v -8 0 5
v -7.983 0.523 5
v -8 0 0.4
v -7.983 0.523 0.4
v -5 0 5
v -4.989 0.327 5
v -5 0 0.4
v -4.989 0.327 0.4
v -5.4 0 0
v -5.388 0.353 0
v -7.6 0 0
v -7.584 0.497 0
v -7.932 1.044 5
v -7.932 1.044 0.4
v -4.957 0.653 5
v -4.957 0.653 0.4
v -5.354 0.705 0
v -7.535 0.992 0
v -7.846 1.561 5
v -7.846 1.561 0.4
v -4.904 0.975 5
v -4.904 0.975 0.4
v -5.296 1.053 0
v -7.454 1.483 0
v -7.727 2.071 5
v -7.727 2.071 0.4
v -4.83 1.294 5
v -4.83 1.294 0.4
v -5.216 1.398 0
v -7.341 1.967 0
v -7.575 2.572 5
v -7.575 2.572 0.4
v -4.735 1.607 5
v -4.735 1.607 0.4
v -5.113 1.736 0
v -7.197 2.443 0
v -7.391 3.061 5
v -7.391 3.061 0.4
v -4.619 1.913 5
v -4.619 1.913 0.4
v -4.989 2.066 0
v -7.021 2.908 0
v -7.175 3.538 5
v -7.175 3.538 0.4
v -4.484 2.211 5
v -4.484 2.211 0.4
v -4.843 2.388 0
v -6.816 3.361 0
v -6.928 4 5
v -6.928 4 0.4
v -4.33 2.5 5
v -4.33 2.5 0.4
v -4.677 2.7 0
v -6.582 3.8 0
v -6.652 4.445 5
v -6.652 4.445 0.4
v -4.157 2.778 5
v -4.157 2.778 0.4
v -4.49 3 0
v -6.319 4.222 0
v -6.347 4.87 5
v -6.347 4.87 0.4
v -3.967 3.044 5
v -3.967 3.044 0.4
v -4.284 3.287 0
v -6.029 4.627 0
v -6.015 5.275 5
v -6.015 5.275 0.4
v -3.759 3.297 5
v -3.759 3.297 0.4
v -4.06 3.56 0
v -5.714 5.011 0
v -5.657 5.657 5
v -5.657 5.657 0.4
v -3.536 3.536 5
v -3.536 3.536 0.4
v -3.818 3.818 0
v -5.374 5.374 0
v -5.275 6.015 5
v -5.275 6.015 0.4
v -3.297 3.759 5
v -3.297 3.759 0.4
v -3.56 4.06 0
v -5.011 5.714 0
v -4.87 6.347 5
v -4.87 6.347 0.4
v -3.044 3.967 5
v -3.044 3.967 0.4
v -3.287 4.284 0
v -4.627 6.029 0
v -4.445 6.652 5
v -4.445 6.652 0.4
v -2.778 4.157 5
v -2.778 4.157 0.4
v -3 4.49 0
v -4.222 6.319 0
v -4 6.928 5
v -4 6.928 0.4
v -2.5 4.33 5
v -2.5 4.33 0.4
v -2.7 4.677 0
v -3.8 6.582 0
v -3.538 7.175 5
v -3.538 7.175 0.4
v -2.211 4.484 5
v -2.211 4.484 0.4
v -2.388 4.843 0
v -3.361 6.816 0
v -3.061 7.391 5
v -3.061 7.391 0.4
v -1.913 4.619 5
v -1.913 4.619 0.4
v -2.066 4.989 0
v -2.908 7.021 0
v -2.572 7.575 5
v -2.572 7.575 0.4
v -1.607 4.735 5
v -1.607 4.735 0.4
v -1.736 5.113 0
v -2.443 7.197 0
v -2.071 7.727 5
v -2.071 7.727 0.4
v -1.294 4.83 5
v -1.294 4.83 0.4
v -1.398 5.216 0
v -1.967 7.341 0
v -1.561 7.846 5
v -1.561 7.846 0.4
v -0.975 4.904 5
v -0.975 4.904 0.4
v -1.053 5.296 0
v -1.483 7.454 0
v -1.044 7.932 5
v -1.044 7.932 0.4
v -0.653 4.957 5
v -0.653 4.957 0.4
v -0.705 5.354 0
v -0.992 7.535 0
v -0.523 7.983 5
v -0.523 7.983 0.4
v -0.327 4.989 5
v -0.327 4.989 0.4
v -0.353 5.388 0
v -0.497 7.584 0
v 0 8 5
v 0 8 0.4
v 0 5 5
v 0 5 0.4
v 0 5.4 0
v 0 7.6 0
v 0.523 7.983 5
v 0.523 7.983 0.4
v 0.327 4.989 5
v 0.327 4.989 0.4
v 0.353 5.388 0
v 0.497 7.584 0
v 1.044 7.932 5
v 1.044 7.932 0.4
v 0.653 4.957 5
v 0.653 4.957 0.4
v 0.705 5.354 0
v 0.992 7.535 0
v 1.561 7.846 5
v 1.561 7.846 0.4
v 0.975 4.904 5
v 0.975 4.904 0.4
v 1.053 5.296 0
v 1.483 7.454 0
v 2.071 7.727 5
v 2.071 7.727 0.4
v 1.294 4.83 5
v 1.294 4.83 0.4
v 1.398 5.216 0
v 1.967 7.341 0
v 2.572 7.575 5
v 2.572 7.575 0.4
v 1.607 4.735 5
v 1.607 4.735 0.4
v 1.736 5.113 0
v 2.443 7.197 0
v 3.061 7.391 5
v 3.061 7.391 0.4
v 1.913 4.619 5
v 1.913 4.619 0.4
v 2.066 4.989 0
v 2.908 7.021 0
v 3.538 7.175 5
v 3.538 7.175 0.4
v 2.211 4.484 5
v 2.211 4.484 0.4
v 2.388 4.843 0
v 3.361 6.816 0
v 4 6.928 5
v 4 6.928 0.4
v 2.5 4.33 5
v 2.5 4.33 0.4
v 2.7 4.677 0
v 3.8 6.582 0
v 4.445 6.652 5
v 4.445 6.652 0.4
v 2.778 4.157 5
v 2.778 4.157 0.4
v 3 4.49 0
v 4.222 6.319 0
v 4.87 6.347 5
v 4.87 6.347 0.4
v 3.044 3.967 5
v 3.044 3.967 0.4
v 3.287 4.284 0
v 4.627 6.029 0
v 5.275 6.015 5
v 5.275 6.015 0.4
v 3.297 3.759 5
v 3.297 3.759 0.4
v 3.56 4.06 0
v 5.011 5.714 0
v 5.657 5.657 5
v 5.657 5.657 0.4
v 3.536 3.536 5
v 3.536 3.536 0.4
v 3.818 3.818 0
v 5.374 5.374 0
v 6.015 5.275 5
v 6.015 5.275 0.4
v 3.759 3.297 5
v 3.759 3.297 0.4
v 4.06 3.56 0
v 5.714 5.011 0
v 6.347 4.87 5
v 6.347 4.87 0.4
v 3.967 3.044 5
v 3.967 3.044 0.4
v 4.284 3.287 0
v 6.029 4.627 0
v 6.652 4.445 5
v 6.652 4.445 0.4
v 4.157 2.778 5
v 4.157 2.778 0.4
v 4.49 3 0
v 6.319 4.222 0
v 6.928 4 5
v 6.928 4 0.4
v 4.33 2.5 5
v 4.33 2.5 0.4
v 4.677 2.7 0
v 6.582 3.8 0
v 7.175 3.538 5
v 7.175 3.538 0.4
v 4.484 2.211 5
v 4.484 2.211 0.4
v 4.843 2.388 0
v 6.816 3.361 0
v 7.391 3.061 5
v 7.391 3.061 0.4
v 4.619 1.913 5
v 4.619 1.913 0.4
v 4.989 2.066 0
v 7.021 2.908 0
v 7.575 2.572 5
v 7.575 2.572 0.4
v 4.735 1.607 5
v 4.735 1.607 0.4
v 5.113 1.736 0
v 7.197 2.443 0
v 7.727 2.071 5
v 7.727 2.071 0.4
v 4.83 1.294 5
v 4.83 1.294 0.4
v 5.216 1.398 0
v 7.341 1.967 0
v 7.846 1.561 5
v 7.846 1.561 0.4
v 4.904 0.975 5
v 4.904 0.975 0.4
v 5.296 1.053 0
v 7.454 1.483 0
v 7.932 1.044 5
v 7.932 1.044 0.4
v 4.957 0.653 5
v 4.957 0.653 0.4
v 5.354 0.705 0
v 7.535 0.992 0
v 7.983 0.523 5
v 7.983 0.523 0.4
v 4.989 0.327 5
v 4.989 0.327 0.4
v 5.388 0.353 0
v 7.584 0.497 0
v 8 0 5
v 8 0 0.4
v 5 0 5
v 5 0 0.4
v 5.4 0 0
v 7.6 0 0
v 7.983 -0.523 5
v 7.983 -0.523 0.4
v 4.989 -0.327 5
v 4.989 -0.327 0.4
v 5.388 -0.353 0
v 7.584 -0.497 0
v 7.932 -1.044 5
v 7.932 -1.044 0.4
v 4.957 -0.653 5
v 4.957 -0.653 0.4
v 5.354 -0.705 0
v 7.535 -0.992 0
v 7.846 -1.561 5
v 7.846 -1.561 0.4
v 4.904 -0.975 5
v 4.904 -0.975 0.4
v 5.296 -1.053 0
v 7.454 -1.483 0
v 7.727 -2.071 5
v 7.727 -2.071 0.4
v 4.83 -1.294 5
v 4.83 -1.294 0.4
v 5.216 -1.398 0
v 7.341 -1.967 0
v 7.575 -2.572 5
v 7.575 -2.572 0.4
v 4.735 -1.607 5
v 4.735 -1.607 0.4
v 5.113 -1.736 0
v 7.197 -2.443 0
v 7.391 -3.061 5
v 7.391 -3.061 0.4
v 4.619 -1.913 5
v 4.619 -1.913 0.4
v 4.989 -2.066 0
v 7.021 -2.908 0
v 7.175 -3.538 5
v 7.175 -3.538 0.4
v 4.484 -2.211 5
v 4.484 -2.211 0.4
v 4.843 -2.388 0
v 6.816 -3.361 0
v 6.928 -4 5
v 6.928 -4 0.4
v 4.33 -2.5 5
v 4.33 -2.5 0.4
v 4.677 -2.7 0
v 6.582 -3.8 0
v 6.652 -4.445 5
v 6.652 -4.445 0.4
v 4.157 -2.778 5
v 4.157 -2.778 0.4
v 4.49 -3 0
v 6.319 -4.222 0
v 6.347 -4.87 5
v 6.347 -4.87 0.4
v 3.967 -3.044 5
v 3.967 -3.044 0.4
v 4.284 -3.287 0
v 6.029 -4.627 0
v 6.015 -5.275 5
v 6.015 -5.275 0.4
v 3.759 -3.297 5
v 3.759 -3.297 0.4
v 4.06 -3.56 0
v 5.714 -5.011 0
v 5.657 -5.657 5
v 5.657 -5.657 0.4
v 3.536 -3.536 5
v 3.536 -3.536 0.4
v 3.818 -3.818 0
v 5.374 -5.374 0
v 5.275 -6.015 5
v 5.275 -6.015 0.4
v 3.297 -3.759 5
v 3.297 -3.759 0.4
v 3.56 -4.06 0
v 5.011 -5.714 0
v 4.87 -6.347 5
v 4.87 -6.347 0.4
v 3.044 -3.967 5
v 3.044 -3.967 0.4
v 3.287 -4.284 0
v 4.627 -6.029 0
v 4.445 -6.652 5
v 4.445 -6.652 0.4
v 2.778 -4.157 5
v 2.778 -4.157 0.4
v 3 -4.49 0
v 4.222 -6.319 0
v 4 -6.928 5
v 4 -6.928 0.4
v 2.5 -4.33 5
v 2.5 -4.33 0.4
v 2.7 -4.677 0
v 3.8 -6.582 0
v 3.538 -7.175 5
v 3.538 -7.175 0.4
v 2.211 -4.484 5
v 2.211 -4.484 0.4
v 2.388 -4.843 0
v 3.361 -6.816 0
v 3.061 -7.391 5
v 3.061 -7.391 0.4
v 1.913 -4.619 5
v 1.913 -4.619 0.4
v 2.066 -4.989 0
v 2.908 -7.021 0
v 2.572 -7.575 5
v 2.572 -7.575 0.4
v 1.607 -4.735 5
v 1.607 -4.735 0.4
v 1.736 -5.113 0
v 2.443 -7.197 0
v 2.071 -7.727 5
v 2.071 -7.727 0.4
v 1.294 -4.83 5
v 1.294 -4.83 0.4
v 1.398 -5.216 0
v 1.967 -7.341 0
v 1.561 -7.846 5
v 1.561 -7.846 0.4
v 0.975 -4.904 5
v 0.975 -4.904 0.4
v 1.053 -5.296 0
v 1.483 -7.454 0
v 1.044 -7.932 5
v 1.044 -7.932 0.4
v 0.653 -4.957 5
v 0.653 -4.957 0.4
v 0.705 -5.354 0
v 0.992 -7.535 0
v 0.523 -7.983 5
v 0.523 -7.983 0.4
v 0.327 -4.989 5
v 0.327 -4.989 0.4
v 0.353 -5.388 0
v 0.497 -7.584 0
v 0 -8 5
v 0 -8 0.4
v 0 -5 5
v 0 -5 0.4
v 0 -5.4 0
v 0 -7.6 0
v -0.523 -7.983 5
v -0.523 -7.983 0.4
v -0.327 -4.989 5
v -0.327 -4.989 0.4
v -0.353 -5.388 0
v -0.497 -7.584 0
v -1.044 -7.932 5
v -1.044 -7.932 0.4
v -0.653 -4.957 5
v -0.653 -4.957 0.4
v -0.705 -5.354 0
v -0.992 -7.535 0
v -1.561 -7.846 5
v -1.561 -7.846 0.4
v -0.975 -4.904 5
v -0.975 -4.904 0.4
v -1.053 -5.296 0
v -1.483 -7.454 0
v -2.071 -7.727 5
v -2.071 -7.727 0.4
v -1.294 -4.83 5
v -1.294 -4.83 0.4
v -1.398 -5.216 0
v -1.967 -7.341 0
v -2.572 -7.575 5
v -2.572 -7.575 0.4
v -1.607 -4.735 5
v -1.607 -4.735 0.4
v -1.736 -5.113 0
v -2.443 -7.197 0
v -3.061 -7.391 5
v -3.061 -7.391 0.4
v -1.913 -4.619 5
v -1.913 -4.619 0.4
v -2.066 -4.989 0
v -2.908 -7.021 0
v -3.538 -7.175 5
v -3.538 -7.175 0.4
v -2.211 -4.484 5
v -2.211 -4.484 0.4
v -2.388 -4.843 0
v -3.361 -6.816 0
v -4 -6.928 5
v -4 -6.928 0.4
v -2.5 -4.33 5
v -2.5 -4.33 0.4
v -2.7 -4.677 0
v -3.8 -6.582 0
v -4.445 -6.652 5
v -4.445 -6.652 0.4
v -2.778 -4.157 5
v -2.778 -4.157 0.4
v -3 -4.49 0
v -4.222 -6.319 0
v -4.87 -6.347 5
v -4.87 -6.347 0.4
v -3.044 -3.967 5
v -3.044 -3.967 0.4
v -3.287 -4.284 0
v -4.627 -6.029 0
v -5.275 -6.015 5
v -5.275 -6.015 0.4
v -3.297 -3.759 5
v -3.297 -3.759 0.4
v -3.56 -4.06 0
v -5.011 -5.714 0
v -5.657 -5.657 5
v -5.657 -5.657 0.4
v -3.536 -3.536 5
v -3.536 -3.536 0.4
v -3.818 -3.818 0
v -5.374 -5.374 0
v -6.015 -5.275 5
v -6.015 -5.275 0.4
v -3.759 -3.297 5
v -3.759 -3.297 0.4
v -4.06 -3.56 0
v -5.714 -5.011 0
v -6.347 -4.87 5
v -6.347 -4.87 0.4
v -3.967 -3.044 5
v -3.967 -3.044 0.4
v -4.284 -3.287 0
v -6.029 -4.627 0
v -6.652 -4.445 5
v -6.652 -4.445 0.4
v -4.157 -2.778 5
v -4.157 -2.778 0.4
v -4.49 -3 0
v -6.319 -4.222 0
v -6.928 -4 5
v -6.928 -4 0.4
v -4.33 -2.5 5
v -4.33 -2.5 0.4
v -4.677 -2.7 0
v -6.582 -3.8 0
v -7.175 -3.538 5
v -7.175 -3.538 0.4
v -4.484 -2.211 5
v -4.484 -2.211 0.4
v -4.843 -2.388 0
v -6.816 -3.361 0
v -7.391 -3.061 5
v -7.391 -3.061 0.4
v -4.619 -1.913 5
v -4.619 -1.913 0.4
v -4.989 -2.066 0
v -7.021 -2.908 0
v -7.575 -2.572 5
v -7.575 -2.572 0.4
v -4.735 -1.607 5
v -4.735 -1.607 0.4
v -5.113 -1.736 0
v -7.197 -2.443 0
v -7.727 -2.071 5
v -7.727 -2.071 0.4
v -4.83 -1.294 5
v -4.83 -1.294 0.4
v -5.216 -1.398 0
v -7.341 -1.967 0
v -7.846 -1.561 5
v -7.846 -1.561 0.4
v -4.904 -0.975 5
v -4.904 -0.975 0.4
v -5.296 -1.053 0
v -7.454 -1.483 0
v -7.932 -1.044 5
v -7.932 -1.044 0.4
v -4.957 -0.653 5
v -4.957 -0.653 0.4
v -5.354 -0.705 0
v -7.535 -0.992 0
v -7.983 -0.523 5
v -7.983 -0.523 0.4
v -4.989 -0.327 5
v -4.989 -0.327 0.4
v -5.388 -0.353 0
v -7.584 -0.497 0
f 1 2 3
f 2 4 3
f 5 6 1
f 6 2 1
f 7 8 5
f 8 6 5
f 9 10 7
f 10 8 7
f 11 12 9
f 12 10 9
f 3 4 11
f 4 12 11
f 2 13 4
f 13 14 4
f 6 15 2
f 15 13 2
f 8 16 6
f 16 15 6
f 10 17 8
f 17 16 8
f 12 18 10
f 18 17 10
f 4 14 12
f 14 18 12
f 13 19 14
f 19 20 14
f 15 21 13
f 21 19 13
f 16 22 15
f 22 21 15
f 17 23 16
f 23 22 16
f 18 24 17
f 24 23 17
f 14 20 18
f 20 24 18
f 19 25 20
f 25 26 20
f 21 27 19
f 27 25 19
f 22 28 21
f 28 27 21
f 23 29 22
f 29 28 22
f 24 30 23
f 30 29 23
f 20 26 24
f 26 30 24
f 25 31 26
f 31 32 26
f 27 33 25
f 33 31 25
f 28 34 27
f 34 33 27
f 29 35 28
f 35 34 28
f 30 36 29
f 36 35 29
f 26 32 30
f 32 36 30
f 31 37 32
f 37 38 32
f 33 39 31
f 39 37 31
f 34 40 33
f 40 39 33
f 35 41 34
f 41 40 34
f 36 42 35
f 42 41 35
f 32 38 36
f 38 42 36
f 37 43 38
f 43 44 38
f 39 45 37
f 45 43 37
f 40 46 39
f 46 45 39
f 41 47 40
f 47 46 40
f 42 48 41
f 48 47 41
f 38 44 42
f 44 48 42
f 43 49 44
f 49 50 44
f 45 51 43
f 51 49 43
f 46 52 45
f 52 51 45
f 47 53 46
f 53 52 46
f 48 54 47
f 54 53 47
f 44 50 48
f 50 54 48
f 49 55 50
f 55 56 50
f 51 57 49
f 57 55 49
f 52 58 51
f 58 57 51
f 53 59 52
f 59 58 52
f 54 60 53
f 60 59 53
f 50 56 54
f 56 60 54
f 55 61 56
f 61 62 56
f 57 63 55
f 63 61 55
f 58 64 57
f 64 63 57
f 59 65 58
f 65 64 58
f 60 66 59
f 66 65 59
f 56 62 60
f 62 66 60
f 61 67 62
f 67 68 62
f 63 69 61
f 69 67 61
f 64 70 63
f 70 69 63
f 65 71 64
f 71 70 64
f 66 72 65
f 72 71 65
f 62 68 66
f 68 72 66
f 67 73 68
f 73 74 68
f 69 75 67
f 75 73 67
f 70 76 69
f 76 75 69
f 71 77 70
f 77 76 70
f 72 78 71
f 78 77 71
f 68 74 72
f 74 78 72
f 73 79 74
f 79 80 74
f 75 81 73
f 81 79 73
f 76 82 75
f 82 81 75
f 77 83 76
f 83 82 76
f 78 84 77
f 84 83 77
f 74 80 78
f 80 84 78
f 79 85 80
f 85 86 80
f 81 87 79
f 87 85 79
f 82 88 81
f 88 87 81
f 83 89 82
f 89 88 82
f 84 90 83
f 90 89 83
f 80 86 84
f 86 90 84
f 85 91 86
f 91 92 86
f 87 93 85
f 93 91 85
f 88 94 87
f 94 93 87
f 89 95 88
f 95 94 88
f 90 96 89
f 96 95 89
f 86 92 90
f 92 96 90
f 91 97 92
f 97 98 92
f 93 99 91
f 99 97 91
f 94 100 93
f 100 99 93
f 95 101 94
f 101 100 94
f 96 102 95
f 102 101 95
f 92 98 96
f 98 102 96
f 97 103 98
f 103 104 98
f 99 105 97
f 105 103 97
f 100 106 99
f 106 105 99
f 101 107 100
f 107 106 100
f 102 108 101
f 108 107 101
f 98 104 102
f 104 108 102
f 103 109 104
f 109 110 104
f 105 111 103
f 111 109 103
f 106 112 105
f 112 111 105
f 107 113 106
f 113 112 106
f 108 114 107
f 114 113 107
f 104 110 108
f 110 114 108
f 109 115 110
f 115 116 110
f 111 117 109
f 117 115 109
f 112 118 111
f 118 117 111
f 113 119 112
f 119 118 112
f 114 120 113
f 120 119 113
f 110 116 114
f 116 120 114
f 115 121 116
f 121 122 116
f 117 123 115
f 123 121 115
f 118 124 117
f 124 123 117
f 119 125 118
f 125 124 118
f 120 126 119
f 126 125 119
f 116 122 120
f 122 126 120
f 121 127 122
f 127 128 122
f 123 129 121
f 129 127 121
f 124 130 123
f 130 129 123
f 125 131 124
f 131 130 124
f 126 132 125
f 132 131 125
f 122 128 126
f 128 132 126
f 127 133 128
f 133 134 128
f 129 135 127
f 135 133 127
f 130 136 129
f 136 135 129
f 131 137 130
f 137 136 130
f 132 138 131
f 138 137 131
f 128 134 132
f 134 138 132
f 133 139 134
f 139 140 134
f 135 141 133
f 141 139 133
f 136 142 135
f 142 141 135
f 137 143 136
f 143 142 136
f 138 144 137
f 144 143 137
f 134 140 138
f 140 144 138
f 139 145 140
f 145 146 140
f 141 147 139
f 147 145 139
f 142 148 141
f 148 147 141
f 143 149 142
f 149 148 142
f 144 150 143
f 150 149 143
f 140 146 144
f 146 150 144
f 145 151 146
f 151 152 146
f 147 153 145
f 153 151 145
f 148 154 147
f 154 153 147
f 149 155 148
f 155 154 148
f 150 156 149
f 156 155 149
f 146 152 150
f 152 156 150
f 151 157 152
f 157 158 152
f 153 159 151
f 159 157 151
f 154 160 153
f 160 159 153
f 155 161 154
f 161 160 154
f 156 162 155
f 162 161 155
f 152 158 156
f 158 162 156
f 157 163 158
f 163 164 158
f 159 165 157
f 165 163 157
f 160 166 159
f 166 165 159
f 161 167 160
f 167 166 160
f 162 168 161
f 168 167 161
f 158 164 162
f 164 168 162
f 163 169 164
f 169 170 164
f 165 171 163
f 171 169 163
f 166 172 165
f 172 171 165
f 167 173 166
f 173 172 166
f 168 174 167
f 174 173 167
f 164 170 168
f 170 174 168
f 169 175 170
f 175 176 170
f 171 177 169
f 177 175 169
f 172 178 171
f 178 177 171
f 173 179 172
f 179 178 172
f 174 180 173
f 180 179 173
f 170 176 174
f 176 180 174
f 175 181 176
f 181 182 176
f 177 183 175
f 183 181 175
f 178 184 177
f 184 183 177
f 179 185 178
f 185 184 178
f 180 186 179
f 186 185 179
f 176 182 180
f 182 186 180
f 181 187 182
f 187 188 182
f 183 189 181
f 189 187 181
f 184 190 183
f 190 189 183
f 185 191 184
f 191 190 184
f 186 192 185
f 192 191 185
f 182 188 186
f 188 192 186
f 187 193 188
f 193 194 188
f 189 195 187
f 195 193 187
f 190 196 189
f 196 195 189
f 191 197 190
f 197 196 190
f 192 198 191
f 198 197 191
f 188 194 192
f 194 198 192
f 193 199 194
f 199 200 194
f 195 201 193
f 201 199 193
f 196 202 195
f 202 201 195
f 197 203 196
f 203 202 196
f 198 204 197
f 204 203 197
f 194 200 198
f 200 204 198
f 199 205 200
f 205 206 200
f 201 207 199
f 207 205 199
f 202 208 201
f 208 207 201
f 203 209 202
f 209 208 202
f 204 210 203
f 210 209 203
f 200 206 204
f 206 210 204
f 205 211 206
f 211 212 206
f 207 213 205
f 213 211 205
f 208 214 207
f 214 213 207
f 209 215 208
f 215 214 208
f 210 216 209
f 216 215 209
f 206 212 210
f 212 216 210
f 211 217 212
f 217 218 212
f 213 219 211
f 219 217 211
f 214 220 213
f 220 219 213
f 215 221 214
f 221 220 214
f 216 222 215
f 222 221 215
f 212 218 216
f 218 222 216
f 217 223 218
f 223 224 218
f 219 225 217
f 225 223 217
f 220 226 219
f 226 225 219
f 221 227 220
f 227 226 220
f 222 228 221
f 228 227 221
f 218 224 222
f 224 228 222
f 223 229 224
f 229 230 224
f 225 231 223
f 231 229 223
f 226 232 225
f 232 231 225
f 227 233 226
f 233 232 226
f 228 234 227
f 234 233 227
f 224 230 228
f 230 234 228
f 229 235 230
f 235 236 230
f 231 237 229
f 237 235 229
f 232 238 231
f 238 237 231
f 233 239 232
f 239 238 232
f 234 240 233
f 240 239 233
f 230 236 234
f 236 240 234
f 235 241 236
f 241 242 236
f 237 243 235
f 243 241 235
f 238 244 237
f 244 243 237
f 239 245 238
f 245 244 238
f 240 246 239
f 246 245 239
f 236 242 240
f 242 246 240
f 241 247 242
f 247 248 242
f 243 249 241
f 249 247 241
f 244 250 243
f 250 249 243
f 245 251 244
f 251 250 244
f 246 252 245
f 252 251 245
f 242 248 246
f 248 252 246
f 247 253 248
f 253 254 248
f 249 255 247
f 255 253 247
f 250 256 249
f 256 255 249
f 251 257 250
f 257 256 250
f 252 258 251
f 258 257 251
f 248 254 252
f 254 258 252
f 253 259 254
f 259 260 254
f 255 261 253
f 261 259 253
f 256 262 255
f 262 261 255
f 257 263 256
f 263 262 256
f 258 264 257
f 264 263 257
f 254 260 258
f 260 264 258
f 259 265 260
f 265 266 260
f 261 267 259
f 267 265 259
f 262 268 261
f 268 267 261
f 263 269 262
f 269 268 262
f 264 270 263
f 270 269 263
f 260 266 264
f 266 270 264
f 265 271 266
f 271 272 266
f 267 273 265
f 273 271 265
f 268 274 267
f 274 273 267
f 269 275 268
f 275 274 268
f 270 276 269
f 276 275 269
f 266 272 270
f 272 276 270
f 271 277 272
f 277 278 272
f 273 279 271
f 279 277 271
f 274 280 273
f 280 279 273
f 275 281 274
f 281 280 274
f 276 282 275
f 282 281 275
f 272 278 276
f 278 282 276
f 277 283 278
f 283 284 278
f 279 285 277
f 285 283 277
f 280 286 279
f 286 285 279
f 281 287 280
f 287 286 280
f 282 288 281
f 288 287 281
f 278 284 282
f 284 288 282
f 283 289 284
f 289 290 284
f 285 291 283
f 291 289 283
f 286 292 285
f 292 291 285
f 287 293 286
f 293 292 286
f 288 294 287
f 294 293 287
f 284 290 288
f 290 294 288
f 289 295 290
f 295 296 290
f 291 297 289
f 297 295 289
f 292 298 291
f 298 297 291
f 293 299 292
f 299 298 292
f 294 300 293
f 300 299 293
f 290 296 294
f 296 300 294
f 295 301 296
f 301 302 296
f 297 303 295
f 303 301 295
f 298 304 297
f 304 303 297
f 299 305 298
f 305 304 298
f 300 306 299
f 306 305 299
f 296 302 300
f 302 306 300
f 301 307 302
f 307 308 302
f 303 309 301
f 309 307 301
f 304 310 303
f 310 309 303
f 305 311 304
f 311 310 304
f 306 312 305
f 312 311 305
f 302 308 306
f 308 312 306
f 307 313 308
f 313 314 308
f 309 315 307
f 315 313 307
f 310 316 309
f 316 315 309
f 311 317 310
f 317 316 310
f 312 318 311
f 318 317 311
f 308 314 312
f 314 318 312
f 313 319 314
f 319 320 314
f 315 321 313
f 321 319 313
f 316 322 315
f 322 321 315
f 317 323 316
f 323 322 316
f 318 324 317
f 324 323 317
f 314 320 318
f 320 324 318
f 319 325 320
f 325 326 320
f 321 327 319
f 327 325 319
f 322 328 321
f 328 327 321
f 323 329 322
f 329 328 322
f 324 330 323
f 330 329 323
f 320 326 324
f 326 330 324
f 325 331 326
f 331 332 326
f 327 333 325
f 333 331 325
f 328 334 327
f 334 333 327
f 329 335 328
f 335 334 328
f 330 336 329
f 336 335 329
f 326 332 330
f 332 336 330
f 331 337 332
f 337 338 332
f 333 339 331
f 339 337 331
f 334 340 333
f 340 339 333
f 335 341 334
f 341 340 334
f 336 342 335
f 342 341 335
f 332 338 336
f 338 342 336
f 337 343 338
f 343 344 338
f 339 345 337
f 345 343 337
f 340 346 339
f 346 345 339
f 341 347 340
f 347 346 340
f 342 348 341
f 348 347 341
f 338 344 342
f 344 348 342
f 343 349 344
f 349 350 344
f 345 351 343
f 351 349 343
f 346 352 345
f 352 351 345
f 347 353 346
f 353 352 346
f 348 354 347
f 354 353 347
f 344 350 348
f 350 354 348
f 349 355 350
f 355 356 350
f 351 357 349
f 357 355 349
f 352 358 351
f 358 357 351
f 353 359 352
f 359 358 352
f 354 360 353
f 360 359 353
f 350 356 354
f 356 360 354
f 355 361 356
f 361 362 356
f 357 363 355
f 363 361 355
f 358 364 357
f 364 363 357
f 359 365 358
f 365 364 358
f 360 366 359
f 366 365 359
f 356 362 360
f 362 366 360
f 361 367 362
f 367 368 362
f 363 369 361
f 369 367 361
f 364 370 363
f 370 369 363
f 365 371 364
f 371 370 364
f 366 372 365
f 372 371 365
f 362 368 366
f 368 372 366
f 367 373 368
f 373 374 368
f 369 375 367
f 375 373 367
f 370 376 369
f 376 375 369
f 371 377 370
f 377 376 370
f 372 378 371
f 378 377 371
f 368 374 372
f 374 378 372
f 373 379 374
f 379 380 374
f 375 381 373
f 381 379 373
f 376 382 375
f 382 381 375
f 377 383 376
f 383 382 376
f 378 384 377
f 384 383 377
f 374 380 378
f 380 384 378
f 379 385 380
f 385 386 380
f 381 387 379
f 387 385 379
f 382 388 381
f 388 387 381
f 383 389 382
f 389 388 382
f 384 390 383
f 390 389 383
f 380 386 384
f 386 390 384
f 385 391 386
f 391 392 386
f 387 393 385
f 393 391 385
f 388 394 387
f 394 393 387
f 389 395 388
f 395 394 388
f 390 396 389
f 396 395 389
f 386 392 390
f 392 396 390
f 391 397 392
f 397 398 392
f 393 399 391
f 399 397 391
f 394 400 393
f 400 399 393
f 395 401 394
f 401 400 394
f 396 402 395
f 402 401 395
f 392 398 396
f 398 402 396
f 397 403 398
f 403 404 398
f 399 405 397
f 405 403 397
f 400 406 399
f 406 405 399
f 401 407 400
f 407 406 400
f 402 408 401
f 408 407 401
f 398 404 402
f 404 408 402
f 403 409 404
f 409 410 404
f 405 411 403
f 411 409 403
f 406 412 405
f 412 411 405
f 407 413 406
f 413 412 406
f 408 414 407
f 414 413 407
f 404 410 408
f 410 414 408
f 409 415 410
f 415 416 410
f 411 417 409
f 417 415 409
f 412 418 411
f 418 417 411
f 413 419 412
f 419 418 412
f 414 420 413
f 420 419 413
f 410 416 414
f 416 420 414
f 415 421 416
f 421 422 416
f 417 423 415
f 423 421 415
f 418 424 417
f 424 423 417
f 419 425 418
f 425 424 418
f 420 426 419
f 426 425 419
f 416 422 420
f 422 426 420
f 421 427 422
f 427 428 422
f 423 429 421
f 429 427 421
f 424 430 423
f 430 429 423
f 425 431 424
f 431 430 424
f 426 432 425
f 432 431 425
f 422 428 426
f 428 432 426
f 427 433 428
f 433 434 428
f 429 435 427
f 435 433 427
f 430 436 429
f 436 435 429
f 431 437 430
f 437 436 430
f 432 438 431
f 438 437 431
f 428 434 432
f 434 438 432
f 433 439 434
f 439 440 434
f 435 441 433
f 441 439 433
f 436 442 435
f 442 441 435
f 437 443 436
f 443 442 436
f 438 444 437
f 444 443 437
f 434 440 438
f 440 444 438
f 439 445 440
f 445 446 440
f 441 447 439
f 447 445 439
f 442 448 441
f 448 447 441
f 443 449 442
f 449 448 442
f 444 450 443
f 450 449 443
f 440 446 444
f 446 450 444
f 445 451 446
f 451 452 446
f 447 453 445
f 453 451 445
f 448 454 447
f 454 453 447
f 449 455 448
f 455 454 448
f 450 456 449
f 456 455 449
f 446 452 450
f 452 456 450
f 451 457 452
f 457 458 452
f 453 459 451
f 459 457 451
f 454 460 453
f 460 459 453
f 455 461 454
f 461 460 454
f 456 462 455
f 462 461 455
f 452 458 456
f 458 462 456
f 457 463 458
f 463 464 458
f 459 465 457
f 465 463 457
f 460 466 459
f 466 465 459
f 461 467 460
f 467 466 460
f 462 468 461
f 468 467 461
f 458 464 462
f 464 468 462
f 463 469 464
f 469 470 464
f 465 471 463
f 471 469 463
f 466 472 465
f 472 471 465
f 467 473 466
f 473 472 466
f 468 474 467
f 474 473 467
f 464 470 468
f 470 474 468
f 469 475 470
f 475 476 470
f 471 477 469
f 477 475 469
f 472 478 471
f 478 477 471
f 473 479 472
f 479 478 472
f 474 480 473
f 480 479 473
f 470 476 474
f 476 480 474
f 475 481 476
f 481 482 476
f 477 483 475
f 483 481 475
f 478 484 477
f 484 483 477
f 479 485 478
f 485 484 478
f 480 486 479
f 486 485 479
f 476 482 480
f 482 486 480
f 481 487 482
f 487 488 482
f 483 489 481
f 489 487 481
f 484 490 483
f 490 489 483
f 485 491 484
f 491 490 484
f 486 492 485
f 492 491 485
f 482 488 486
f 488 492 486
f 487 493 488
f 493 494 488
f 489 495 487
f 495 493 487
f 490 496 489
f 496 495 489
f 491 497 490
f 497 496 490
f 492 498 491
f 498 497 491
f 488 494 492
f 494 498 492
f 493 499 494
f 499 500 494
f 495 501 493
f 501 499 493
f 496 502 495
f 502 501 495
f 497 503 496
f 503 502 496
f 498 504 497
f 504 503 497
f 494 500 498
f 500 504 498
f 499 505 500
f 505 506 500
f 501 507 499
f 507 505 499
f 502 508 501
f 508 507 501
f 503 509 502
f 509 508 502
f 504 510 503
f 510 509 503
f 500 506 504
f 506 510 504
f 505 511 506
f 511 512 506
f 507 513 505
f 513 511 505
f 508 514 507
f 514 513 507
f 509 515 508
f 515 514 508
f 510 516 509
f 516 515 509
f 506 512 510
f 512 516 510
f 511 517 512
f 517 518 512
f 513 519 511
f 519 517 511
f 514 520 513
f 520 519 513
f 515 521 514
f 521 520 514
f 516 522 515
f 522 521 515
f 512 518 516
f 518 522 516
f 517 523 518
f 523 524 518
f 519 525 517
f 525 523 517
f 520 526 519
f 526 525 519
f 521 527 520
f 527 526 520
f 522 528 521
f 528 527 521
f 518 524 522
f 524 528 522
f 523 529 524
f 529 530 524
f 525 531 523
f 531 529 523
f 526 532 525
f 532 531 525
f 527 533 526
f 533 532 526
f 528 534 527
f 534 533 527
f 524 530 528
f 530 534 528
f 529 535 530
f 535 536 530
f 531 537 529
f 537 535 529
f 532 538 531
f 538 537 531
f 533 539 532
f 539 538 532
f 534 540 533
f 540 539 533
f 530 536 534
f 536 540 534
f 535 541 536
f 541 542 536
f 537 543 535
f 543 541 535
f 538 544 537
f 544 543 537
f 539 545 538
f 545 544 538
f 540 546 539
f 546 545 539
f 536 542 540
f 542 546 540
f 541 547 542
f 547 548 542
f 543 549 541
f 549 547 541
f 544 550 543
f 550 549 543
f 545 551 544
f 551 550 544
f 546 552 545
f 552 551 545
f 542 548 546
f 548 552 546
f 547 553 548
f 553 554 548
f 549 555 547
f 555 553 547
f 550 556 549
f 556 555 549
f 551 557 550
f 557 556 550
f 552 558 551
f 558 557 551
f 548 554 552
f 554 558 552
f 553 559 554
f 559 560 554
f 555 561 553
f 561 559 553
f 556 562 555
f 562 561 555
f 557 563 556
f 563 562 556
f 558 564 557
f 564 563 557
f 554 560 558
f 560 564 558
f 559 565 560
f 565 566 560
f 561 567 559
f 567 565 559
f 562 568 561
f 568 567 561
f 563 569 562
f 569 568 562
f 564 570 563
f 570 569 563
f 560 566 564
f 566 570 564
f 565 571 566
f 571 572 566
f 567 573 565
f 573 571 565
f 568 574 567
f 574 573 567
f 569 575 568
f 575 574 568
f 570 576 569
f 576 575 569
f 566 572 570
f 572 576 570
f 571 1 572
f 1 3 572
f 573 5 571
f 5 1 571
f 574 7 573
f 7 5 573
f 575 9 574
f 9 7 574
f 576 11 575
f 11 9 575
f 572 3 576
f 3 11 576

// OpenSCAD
// Unthreaded spacer: 16 OD x 5 long, 10 mm through-bore.
outer_diameter = 16;
bore_diameter = 10;
length = 5;
chamfer = 0.4;  // bottom chamfer keeps elephant's foot off the bore and rim
$fn = 96;

difference() {
    rotate_extrude()
        polygon([
            [bore_diameter/2 + chamfer, 0], [outer_diameter/2 - chamfer, 0],
            [outer_diameter/2, chamfer], [outer_diameter/2, length],
            [bore_diameter/2, length], [bore_diameter/2, chamfer]
        ]);
}
